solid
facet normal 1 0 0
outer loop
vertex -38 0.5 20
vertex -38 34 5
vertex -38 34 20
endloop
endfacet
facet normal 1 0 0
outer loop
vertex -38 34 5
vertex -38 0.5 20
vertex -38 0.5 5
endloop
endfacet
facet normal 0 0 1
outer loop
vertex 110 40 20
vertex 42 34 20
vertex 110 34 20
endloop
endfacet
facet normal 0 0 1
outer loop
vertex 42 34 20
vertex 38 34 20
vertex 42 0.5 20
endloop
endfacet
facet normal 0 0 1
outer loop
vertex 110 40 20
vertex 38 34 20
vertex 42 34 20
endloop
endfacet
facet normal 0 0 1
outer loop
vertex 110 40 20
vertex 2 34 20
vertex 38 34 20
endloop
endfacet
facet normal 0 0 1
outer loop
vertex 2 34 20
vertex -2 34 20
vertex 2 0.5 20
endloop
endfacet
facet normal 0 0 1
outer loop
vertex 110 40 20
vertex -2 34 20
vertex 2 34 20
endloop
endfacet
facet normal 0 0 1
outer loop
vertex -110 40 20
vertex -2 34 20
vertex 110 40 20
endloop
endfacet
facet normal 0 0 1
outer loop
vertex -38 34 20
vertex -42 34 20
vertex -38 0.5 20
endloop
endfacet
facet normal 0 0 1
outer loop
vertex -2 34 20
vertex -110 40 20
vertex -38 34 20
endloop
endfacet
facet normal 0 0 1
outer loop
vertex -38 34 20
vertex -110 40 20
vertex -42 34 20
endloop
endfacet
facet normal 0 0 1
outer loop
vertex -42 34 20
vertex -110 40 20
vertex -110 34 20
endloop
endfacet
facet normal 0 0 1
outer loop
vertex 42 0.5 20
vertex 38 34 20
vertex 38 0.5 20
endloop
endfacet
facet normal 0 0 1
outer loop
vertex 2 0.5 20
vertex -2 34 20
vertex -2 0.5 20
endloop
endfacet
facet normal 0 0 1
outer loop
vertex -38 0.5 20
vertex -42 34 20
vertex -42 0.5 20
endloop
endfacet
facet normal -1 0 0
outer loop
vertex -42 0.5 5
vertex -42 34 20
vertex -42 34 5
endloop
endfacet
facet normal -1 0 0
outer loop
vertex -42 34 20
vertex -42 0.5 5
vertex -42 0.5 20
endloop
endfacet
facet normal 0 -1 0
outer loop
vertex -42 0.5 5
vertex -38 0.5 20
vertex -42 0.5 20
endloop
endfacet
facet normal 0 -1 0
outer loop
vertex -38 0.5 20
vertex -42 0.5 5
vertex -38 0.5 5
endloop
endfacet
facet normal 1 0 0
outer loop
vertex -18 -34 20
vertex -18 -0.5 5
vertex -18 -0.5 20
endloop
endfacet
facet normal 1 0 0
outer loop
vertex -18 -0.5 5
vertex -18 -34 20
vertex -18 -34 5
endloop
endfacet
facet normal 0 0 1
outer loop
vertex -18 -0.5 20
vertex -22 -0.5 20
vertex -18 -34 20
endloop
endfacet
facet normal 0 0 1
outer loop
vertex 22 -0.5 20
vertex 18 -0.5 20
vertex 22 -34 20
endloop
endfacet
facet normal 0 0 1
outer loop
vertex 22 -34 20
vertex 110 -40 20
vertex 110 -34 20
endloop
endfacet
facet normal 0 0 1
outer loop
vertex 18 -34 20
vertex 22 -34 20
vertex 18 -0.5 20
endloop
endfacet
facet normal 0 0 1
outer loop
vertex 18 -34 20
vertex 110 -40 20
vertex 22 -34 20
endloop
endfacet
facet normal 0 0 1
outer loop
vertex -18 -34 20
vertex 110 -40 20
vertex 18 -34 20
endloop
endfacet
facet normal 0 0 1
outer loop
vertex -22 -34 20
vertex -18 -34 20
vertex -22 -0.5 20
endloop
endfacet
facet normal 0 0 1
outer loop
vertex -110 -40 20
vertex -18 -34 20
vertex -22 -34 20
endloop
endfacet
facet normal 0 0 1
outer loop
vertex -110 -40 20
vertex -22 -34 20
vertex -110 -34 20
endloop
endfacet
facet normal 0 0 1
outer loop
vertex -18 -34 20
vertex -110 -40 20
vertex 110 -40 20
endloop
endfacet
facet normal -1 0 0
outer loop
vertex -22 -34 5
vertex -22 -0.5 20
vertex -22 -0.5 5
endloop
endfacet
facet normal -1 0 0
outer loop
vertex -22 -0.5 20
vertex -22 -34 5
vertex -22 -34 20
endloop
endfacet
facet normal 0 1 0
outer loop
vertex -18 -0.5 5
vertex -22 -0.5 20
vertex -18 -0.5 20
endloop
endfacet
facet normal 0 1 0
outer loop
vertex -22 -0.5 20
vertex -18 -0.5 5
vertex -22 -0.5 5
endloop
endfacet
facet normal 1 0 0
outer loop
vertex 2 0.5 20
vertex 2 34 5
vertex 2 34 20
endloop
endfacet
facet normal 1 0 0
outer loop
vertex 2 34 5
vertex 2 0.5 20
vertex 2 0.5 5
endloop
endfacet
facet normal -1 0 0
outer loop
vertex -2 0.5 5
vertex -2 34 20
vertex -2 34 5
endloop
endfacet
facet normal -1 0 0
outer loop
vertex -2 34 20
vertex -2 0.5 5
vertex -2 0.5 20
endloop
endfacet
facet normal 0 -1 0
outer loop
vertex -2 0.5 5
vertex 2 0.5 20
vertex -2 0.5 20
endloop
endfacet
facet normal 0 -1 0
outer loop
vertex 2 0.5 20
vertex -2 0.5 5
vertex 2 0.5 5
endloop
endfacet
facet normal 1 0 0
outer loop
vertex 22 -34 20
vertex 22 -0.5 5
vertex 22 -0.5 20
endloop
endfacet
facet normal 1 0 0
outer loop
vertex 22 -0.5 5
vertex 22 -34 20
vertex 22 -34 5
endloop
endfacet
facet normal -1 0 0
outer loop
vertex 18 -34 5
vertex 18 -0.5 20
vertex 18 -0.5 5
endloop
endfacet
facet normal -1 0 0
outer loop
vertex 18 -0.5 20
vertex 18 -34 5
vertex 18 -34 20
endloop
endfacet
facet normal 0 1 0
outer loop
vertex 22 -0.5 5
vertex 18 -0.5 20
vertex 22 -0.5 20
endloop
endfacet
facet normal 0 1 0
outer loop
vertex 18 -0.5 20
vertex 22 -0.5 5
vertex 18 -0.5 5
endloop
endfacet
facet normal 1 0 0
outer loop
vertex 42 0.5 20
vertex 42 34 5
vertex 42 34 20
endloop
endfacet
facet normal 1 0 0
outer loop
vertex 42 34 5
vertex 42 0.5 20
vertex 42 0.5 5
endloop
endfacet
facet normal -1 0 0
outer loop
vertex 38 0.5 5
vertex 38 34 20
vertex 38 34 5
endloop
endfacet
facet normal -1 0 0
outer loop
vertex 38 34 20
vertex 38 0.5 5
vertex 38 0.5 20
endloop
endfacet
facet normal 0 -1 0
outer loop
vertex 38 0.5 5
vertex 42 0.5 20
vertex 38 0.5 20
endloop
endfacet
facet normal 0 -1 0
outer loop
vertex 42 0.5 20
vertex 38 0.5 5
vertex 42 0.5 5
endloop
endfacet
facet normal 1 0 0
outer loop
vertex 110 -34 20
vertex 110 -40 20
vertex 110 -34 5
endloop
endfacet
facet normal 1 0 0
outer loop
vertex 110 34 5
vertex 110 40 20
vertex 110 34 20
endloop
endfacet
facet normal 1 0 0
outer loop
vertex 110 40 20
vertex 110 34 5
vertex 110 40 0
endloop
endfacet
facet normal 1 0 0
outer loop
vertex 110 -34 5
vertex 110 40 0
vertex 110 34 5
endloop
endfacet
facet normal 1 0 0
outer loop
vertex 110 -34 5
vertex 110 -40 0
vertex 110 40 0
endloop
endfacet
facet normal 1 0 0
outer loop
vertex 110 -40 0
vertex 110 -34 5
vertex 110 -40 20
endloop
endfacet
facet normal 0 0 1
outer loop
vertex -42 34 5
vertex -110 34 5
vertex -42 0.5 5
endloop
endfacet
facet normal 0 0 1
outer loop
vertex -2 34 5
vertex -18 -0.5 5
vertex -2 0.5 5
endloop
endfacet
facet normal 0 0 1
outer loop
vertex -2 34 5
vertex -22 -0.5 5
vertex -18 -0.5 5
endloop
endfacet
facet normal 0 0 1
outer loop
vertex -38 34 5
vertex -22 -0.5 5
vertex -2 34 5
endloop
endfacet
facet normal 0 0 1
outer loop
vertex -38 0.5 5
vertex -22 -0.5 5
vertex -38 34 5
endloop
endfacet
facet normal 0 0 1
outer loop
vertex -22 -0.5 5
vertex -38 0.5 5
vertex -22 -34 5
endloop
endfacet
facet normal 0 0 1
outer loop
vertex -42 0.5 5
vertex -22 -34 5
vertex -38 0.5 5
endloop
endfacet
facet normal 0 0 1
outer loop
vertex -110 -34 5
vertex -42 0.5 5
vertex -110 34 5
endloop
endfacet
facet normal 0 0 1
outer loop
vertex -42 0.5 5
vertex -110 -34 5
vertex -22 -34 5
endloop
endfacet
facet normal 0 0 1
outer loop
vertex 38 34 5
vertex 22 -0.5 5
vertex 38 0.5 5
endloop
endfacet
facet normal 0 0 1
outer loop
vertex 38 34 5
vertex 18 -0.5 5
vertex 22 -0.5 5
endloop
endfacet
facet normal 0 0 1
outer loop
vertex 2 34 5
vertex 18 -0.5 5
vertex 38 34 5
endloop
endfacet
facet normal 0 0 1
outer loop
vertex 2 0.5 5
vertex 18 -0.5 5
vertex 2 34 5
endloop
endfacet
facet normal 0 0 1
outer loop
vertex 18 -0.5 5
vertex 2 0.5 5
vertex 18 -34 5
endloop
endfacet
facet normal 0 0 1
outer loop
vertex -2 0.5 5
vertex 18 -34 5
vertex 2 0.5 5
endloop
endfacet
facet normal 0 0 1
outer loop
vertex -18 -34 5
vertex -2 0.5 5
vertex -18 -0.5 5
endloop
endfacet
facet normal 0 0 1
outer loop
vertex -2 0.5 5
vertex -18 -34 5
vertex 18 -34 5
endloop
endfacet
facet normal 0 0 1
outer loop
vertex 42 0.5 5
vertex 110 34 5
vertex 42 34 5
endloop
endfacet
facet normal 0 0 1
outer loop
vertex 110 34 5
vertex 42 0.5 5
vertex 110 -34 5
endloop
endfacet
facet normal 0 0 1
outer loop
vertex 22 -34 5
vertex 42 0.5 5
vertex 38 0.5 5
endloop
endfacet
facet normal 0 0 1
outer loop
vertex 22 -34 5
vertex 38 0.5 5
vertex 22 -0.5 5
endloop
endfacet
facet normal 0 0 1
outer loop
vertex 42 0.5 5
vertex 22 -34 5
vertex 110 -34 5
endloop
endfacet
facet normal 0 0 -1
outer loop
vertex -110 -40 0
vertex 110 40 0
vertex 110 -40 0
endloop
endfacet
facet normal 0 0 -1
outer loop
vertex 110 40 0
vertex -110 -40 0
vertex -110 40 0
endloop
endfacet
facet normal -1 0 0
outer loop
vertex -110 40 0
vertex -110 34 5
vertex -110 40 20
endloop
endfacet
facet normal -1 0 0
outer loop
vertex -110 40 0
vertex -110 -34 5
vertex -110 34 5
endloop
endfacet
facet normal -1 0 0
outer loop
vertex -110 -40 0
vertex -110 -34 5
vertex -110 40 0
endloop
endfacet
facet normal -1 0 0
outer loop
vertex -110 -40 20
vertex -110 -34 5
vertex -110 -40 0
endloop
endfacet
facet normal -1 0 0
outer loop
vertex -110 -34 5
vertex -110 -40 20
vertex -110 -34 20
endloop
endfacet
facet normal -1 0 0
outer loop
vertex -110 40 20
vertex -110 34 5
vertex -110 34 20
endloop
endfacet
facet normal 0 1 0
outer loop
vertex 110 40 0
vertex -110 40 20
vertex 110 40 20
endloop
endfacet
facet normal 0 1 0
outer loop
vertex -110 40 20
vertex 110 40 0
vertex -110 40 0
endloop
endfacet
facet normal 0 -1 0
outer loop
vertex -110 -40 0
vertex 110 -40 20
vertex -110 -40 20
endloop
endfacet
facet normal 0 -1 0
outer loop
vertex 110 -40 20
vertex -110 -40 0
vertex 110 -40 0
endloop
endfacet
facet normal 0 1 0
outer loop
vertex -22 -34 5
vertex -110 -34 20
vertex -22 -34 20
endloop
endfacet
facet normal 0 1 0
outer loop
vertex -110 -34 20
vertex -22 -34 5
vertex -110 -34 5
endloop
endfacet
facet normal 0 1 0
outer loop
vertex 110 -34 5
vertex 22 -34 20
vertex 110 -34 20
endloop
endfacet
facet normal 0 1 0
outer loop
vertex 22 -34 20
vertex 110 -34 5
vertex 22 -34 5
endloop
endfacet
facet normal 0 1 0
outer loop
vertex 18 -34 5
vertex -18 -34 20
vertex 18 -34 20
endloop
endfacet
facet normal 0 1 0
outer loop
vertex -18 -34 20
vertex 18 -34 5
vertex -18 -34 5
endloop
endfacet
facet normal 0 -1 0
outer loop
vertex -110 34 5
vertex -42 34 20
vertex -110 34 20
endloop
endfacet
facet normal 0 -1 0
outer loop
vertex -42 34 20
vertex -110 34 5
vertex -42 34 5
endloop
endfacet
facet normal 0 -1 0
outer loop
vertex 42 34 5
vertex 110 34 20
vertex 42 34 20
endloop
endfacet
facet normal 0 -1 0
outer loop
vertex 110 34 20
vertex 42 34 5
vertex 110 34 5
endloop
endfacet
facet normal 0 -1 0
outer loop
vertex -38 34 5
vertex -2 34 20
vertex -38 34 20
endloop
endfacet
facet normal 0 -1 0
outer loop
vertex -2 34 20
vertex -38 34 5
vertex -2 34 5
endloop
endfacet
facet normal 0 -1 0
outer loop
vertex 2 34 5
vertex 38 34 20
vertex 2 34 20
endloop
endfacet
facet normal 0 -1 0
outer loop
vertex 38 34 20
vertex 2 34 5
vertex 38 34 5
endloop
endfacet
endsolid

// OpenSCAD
$fn = 32;

// ----------------------------------------------------------------------
// Rib frame 220 x 80 x 20
// 5 ribs at 20 mm pitch, staggered
// ----------------------------------------------------------------------

// --- parameters (mm) ---
frame = [220, 80, 5];  // base plate size (x, y, z)
rail_w = 6;            // side rail width
ribs = 5;              // number of ribs
rib_t = 4;             // rib thickness
rib_h = 15;            // rib height above the base plate
pitch = 20;            // pitch between rib centres

// --- derived feature positions (mm) ---
span = (ribs - 1) * pitch;          // = 80   distance between the outer ribs
origin_x = -span / 2;               // = -40   X of the first rib
rib_len = frame[1] / 2 - rail_w + 0.5;  // = 34.5   length of a staggered rib
rib_y = 0.5 + rib_len / 2;          // = 17.75   Y of a staggered rib centre
row_offset = 2 * rib_y;             // = 35.5   distance between the two rows
feature_centers = [
  [origin_x + 0 * pitch, rib_y],
  [origin_x + 1 * pitch, -rib_y],
  [origin_x + 2 * pitch, rib_y],
  [origin_x + 3 * pitch, -rib_y],
  [origin_x + 4 * pitch, rib_y]
];   // rib centre line, drives the rib loop

// base plate, two side rails, then the ribs read straight off feature_centers
union() {
  translate([-frame[0] / 2, -frame[1] / 2, 0]) cube(frame);
  translate([-frame[0] / 2, -frame[1] / 2, 0]) cube([frame[0], rail_w, frame[2] + rib_h]);
  translate([-frame[0] / 2, frame[1] / 2 - rail_w, 0]) cube([frame[0], rail_w, frame[2] + rib_h]);
  for (centre = feature_centers)
    translate([centre[0] - rib_t / 2, centre[1] - rib_len / 2, frame[2] - 1])
      cube([rib_t, rib_len, rib_h + 1]);
}
